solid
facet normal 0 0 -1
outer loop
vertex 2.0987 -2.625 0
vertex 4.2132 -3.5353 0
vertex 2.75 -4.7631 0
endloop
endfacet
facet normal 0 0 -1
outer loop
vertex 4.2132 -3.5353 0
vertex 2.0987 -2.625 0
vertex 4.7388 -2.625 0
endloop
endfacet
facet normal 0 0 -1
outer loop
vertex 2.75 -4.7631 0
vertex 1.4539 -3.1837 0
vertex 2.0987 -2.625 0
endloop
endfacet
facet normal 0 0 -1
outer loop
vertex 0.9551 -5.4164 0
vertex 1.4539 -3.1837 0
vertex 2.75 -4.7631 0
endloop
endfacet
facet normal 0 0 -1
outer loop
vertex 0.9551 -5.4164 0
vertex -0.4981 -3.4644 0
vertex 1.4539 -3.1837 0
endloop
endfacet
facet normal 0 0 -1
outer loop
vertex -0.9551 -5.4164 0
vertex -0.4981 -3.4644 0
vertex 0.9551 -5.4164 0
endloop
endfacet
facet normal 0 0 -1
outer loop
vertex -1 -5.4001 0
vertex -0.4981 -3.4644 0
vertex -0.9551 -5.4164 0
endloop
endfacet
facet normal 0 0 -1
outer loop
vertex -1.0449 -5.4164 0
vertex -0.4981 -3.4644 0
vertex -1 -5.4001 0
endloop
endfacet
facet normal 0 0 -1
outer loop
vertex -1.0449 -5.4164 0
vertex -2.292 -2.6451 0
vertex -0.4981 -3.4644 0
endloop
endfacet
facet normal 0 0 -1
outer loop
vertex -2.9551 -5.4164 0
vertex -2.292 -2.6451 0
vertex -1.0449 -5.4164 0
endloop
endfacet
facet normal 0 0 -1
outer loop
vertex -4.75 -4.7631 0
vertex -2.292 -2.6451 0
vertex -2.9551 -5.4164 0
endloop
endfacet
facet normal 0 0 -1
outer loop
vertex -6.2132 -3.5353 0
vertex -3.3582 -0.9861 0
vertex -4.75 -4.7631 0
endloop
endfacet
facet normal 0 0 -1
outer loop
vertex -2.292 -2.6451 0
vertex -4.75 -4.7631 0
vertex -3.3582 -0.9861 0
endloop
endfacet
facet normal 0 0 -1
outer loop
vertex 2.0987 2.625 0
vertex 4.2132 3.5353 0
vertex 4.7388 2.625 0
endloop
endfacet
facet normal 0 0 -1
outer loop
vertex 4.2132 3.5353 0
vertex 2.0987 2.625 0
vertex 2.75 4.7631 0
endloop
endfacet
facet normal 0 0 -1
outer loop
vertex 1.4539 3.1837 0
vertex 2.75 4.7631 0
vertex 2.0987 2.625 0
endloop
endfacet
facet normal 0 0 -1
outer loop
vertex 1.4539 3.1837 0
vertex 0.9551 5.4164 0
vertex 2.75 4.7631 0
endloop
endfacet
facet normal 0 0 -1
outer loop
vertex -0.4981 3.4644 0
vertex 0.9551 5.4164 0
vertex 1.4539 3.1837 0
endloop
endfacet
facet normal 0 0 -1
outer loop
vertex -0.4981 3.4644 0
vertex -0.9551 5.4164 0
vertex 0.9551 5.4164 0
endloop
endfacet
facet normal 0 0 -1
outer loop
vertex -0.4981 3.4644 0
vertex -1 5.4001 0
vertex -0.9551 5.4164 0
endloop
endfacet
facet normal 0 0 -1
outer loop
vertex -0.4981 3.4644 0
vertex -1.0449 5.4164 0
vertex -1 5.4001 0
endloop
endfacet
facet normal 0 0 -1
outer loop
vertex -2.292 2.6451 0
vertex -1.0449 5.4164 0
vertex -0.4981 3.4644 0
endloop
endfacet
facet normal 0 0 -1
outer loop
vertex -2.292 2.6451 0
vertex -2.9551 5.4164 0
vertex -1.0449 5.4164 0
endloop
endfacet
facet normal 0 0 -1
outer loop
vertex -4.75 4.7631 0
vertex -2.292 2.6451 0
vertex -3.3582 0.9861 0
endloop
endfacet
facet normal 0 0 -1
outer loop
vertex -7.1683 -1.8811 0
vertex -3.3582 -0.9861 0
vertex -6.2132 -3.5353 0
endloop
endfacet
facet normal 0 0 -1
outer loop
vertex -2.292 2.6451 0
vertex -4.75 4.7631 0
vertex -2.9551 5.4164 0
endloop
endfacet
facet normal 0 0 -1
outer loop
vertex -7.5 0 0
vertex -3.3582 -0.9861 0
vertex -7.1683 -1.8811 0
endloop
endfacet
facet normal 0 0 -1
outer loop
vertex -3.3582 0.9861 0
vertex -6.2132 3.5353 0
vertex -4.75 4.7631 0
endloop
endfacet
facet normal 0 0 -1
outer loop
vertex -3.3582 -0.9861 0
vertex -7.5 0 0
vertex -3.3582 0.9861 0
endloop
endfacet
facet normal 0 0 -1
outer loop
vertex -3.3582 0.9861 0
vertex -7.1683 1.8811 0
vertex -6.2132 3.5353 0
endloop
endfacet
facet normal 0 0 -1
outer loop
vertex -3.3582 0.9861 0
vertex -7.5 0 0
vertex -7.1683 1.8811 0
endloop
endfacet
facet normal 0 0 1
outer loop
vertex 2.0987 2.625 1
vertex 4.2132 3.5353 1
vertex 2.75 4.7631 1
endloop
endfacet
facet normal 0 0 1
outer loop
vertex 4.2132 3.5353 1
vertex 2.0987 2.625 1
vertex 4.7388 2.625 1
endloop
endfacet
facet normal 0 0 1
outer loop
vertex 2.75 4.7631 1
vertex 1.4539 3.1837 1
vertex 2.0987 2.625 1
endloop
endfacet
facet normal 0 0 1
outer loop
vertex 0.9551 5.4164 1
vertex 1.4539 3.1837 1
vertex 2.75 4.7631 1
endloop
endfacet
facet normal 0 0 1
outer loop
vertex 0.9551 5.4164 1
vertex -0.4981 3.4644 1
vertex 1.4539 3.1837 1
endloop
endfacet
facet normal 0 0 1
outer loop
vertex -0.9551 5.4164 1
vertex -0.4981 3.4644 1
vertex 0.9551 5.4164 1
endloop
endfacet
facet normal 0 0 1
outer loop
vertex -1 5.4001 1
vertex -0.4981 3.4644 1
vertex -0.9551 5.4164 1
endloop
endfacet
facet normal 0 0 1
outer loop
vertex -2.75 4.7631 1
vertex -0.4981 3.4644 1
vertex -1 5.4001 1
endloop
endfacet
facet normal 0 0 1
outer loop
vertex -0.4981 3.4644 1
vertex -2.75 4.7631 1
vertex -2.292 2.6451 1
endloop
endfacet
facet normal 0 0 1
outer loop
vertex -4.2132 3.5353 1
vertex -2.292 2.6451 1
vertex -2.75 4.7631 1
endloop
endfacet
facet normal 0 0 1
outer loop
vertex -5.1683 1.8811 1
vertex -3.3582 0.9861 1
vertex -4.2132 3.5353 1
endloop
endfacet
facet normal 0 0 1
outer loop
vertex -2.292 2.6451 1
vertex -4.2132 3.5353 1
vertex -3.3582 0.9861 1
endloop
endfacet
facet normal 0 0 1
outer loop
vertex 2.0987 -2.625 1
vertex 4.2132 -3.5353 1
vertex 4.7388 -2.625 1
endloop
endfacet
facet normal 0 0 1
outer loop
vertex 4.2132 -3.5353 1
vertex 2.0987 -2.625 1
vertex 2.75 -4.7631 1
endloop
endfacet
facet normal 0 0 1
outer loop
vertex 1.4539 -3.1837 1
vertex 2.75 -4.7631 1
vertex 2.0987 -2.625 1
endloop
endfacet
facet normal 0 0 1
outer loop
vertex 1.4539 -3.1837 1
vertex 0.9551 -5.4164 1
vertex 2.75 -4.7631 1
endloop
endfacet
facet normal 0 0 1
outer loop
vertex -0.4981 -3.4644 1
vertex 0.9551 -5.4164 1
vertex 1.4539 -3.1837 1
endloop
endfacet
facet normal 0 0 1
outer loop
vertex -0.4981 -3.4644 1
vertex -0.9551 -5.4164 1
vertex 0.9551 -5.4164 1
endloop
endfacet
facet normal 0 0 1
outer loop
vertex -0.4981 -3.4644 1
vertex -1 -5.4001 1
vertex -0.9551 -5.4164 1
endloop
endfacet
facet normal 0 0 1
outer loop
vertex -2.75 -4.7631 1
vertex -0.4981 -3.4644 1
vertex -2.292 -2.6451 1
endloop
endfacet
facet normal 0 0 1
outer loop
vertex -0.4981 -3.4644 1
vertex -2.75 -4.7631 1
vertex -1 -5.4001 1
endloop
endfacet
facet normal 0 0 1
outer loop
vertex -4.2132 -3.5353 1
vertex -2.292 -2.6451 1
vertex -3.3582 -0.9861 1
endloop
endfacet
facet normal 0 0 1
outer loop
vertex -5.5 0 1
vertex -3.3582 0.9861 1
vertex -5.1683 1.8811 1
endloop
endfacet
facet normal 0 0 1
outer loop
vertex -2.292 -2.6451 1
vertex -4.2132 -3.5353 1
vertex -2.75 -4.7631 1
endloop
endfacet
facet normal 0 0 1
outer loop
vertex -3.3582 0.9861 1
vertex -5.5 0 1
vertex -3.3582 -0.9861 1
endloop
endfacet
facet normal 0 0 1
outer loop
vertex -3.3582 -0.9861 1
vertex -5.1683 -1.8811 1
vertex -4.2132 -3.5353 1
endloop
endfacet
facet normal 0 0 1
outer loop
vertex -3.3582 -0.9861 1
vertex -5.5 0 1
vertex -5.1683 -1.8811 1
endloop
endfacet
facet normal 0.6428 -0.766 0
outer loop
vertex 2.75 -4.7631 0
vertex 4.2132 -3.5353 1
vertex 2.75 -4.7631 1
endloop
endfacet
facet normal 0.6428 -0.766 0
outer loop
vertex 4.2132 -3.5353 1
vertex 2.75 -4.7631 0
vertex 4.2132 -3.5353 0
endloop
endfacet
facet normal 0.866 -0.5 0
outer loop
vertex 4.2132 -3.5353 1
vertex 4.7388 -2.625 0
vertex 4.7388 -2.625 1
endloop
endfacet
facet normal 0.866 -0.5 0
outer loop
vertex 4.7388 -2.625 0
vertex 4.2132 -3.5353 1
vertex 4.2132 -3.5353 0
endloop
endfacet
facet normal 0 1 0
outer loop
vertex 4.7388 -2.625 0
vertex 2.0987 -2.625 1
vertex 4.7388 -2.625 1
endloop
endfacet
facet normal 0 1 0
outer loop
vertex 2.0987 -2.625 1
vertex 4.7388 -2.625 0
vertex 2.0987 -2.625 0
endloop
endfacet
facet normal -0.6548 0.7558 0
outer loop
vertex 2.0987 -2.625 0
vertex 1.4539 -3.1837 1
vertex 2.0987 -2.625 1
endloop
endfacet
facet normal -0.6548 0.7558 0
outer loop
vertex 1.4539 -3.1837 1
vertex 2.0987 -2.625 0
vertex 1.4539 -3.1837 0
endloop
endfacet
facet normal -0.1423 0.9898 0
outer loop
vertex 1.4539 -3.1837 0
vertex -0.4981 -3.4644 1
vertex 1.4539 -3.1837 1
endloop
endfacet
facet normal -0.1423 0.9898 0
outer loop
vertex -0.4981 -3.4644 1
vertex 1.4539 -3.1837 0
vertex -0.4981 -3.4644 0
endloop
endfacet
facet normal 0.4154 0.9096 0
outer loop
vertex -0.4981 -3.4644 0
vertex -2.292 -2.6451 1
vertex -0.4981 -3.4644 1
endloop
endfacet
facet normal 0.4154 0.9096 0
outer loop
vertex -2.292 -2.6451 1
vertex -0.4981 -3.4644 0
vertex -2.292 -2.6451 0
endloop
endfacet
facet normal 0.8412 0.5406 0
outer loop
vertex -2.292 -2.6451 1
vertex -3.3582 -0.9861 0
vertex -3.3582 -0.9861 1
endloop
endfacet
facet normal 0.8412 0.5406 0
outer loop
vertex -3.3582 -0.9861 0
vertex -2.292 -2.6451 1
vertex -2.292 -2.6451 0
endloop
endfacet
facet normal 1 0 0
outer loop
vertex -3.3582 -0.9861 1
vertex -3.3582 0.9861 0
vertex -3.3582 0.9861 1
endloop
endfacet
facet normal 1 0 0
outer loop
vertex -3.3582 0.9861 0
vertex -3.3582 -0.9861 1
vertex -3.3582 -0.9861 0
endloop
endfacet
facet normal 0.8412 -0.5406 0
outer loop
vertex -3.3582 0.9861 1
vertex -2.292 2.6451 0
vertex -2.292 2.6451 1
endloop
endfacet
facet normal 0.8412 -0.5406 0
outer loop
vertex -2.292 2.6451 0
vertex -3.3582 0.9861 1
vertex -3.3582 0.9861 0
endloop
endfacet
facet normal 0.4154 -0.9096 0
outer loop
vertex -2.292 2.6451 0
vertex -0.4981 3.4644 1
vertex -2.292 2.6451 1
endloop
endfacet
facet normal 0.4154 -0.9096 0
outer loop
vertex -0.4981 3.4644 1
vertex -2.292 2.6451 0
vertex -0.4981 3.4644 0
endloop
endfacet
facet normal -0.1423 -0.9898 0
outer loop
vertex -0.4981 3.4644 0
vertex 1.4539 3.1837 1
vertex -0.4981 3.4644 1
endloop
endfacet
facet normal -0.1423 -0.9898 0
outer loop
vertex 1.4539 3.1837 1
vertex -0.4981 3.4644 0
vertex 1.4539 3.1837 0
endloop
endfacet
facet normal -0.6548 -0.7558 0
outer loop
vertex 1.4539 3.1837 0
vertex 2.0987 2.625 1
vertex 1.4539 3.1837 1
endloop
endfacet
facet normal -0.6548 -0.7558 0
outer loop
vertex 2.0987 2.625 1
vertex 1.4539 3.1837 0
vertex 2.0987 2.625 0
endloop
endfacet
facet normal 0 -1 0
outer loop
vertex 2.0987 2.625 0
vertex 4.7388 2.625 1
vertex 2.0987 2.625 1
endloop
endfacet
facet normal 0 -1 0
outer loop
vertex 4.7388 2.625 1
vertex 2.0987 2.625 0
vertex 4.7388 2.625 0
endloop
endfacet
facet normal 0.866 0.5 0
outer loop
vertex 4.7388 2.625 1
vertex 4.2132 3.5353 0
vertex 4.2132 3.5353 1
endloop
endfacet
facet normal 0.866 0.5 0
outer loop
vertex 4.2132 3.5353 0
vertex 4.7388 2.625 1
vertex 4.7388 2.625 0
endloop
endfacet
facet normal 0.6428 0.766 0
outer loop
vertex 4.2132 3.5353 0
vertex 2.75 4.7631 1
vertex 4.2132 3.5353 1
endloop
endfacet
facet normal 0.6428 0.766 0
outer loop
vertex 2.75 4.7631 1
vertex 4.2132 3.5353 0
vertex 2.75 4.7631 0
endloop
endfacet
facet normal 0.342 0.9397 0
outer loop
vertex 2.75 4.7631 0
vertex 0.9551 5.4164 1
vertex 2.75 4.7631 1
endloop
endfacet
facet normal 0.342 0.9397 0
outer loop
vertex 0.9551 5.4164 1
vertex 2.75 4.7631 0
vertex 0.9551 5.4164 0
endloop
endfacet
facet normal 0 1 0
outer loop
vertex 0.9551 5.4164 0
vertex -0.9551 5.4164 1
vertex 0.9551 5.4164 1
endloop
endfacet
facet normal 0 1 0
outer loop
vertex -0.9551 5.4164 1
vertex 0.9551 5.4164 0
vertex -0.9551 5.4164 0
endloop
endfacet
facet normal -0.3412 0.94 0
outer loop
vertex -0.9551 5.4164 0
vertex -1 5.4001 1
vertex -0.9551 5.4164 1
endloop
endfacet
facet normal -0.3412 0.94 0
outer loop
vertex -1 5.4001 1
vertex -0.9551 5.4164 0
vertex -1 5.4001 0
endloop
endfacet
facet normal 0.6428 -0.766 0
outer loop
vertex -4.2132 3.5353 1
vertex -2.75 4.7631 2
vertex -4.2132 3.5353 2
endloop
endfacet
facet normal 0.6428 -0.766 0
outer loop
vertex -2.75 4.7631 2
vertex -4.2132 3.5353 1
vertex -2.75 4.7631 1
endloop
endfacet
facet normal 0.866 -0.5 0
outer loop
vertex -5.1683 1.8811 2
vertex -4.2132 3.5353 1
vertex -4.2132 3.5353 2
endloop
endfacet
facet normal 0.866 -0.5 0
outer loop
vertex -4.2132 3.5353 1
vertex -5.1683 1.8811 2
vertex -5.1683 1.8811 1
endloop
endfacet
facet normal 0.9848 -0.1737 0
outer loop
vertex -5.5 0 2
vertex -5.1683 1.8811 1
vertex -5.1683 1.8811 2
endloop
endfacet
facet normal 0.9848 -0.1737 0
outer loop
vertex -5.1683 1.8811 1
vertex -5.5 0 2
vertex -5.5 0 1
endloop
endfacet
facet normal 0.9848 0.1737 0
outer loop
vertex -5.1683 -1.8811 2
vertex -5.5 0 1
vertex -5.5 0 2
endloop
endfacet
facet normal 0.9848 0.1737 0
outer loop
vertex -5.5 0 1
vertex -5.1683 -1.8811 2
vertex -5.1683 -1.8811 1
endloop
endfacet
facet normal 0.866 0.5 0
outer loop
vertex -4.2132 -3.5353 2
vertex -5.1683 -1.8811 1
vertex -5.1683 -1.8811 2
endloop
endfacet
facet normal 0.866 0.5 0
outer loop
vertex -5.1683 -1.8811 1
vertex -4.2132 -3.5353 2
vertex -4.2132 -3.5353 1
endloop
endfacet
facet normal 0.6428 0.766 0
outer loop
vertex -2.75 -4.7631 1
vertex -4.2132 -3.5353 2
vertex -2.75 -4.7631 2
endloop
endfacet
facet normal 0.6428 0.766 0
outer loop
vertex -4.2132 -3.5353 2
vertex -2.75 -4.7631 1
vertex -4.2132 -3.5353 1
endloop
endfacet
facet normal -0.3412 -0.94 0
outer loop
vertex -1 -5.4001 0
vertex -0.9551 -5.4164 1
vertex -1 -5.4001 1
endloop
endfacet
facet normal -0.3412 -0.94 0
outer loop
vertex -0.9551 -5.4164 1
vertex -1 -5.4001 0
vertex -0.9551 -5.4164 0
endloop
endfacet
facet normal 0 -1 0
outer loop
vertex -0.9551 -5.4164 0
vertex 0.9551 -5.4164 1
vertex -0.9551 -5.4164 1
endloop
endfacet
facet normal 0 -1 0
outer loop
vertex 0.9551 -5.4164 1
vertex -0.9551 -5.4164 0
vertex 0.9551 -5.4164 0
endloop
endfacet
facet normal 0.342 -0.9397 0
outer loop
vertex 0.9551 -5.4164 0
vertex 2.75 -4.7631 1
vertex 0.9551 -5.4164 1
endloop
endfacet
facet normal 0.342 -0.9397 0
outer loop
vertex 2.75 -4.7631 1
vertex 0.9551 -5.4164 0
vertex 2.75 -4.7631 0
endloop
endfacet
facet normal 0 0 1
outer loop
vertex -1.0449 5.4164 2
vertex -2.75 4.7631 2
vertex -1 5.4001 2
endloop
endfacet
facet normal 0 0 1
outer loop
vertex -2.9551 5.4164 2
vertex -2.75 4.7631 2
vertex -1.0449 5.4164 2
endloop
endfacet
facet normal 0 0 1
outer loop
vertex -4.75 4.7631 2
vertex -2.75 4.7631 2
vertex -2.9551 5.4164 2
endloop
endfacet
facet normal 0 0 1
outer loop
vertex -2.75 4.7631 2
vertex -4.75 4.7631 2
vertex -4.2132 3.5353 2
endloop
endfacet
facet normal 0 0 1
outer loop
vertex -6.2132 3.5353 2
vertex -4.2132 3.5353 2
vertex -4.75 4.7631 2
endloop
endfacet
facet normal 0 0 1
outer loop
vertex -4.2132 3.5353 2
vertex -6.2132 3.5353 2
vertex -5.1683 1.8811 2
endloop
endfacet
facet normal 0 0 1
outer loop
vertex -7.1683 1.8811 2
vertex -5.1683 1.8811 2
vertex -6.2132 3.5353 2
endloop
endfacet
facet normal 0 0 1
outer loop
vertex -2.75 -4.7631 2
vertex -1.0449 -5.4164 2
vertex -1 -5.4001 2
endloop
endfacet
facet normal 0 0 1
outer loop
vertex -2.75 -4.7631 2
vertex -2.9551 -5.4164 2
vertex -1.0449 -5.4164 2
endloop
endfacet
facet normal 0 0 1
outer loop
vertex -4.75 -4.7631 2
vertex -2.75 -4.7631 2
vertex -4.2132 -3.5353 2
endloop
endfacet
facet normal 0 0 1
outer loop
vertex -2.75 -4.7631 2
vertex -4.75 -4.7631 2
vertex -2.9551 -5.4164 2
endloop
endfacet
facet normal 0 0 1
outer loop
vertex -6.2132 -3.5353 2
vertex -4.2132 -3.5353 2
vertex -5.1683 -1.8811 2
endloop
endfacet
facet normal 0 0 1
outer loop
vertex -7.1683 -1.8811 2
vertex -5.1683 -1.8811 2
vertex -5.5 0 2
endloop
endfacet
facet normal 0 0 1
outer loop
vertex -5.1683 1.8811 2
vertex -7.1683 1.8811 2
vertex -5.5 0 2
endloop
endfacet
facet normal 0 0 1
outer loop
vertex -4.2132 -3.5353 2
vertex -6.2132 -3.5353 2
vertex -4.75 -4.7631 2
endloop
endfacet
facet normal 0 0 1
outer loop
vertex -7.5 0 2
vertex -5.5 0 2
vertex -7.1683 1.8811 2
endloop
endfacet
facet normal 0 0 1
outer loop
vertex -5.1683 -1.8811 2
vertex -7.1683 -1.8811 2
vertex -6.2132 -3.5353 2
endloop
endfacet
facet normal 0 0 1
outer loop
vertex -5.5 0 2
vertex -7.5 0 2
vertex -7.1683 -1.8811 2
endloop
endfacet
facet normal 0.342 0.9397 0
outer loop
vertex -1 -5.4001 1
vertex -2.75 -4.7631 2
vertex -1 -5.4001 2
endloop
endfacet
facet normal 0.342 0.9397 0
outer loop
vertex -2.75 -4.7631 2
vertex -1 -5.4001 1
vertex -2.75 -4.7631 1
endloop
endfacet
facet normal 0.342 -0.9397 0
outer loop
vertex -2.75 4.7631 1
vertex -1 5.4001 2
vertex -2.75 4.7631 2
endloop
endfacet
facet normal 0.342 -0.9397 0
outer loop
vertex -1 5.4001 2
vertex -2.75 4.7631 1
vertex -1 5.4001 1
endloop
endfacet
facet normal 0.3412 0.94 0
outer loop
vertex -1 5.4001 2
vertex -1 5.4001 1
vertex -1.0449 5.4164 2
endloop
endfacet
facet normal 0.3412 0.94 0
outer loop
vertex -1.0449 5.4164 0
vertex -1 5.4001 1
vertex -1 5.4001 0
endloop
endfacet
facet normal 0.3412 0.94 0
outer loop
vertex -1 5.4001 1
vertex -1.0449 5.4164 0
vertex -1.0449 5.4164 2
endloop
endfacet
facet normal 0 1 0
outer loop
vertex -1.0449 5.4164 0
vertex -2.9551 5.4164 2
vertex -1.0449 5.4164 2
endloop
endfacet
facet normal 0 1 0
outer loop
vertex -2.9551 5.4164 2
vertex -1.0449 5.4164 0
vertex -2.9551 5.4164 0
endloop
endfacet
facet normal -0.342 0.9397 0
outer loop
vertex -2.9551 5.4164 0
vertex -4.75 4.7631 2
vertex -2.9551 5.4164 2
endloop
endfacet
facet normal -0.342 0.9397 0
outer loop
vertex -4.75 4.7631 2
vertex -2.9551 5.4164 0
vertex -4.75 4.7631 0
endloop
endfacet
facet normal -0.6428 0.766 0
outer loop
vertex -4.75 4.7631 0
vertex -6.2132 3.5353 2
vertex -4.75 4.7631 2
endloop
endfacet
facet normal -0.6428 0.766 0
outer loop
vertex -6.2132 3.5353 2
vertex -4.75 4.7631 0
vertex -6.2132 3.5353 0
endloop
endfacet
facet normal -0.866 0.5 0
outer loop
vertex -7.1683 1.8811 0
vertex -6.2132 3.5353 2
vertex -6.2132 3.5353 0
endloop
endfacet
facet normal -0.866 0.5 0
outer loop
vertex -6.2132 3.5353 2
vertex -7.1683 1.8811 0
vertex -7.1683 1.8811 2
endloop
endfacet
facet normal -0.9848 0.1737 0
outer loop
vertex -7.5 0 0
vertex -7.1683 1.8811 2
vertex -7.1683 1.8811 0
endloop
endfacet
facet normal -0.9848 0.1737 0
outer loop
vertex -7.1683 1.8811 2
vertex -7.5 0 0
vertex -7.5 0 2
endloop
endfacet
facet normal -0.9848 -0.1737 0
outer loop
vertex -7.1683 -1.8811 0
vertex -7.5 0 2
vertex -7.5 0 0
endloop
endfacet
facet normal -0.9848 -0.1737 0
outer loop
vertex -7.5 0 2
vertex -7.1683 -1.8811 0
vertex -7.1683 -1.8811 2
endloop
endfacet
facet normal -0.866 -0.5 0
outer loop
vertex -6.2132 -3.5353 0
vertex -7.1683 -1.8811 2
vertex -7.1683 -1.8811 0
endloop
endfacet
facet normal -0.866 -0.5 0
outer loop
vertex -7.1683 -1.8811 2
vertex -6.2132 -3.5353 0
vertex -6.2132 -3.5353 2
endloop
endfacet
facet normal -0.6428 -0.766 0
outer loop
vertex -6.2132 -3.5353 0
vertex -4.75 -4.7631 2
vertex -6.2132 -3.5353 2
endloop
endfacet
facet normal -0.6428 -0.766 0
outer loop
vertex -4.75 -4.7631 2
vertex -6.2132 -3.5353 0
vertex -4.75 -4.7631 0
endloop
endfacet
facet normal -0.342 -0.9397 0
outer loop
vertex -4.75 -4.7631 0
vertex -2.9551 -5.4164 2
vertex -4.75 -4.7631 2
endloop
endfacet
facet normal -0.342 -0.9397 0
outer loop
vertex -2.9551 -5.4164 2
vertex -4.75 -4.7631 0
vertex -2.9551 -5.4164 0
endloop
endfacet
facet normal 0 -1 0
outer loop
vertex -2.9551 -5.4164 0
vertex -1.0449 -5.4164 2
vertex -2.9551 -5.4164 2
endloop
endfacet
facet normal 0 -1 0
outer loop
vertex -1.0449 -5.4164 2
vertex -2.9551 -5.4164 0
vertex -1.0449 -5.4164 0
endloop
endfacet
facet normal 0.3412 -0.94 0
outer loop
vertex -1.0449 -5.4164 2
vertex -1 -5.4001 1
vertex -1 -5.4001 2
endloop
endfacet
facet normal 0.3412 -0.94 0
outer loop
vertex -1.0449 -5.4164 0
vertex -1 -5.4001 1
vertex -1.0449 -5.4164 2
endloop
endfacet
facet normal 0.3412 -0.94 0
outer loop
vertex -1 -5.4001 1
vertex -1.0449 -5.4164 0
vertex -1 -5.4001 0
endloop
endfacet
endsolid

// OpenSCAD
module circlip(D = 11, d = 7, h = 1, H = 2, o = 0.75) {
	linear_extrude(h) {
		difference() {
			union() {
				circle(d = D);
			}
			circle(d = d);
			translate([D / 2, 0]) square(center = true, [D, d * o]);
		}
	}
	linear_extrude(H) {
		difference() {
			translate([-H, 0]) circle(d = D);
			circle(d = D);
		}
	}
}
circlip();
